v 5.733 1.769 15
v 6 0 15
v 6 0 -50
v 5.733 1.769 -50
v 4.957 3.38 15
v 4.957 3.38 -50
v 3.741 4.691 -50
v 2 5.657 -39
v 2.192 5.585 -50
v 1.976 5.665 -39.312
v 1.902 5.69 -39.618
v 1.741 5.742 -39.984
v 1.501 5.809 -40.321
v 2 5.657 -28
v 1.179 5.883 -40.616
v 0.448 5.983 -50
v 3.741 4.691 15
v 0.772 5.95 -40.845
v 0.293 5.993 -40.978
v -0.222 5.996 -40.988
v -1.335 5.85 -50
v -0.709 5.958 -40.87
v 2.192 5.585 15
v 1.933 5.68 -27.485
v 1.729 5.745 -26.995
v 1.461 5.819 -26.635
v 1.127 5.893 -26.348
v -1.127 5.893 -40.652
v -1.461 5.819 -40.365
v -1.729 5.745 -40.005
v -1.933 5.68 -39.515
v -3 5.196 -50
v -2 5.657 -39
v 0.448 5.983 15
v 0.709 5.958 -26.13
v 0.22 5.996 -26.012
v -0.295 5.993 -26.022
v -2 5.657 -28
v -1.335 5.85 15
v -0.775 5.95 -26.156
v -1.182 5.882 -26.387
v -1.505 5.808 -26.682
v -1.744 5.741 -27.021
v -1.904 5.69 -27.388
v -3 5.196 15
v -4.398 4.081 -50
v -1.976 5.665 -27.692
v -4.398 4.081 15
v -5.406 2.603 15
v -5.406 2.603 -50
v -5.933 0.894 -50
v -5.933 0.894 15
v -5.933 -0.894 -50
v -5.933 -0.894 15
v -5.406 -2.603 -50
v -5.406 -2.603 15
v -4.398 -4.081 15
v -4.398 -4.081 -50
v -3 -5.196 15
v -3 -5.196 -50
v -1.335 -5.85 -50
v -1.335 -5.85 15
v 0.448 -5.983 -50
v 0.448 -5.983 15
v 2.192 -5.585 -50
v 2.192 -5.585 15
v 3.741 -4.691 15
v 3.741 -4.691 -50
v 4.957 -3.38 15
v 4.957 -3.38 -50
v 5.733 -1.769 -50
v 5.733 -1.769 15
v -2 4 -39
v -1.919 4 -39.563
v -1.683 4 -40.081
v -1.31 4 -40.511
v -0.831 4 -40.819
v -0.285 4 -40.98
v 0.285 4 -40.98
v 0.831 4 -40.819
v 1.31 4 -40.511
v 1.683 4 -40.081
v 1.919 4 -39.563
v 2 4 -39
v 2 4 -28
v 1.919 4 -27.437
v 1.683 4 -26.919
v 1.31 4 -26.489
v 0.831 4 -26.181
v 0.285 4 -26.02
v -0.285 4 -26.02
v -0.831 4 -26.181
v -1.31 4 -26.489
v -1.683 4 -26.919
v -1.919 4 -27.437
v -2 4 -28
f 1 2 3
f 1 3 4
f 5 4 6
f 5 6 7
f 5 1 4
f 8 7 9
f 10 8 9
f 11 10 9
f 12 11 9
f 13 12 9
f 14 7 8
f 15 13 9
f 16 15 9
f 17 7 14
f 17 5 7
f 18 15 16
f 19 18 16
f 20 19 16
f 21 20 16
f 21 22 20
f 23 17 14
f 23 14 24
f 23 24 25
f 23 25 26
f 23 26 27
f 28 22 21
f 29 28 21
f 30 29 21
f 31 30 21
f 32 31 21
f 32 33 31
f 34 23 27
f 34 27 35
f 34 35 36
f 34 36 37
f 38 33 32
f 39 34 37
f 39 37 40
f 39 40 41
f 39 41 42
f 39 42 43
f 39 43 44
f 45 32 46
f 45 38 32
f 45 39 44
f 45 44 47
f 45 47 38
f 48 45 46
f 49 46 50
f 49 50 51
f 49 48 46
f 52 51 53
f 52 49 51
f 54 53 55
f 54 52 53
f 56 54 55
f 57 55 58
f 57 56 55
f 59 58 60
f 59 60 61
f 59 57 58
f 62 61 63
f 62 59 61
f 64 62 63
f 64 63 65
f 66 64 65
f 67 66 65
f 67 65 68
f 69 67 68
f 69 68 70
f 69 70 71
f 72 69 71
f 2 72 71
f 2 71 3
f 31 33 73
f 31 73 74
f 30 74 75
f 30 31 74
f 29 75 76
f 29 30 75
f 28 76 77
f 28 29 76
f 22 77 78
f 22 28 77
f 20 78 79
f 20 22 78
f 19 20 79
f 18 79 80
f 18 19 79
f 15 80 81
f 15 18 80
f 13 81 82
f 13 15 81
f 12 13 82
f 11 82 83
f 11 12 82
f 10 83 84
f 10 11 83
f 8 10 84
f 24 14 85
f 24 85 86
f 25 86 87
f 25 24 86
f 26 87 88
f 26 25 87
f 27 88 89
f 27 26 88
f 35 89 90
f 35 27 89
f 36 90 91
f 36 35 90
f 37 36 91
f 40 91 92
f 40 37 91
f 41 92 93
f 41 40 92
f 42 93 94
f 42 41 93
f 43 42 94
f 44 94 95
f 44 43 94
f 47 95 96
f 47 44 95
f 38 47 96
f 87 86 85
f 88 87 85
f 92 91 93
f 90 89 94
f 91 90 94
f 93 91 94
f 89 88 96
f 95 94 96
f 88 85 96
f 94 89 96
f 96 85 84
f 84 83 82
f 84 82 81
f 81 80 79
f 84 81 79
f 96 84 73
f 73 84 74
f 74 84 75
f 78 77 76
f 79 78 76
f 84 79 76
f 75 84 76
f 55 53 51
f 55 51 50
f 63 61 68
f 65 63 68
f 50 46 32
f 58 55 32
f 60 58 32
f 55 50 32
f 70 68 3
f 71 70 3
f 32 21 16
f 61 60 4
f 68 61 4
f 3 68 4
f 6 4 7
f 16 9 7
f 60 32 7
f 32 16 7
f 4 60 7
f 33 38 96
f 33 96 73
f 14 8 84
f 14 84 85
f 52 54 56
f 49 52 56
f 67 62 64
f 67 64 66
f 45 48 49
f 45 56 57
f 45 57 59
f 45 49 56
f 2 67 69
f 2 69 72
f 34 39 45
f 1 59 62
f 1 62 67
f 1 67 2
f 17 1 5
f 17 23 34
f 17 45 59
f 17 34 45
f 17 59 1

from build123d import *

# Parameters (mm, degrees)
ESQUISSE1_R             = 6
BOSS_EXTRU_1_DEPTH      = 50
ENL_V_MAT_EXTRU_3_DEPTH = 2
BOSS_EXTRU_2_START      = 15
ESQUISSE4_R             = 6
BOSS_EXTRU_2_DEPTH      = 15


with BuildPart() as part:
    # Esquisse1 → Boss.-Extru.1 (new body)
    with BuildSketch(Plane.XY):
        Circle(ESQUISSE1_R)
    extrude(amount=-BOSS_EXTRU_1_DEPTH)

    # Esquisse3 → Enlèv. mat.-Extru.3 (cut)
    with BuildSketch(Plane(origin=(0, 6, 0), x_dir=(1, 0, 0), z_dir=(0, 1, 0))):
        with BuildLine():
            Line((2, 39), (2, 28))
            ThreePointArc((2, 28), (0, 26), (-2, 28))
            Line((-2, 28), (-2, 39))
            ThreePointArc((-2, 39), (0, 41), (2, 39))
        make_face()
    extrude(amount=-ENL_V_MAT_EXTRU_3_DEPTH, mode=Mode.SUBTRACT)

    # Esquisse4 → Boss.-Extru.2 (add)
    with BuildSketch(Plane.XY.offset(BOSS_EXTRU_2_START)):
        Circle(ESQUISSE4_R)
    extrude(amount=-BOSS_EXTRU_2_DEPTH)


solid = part.part
